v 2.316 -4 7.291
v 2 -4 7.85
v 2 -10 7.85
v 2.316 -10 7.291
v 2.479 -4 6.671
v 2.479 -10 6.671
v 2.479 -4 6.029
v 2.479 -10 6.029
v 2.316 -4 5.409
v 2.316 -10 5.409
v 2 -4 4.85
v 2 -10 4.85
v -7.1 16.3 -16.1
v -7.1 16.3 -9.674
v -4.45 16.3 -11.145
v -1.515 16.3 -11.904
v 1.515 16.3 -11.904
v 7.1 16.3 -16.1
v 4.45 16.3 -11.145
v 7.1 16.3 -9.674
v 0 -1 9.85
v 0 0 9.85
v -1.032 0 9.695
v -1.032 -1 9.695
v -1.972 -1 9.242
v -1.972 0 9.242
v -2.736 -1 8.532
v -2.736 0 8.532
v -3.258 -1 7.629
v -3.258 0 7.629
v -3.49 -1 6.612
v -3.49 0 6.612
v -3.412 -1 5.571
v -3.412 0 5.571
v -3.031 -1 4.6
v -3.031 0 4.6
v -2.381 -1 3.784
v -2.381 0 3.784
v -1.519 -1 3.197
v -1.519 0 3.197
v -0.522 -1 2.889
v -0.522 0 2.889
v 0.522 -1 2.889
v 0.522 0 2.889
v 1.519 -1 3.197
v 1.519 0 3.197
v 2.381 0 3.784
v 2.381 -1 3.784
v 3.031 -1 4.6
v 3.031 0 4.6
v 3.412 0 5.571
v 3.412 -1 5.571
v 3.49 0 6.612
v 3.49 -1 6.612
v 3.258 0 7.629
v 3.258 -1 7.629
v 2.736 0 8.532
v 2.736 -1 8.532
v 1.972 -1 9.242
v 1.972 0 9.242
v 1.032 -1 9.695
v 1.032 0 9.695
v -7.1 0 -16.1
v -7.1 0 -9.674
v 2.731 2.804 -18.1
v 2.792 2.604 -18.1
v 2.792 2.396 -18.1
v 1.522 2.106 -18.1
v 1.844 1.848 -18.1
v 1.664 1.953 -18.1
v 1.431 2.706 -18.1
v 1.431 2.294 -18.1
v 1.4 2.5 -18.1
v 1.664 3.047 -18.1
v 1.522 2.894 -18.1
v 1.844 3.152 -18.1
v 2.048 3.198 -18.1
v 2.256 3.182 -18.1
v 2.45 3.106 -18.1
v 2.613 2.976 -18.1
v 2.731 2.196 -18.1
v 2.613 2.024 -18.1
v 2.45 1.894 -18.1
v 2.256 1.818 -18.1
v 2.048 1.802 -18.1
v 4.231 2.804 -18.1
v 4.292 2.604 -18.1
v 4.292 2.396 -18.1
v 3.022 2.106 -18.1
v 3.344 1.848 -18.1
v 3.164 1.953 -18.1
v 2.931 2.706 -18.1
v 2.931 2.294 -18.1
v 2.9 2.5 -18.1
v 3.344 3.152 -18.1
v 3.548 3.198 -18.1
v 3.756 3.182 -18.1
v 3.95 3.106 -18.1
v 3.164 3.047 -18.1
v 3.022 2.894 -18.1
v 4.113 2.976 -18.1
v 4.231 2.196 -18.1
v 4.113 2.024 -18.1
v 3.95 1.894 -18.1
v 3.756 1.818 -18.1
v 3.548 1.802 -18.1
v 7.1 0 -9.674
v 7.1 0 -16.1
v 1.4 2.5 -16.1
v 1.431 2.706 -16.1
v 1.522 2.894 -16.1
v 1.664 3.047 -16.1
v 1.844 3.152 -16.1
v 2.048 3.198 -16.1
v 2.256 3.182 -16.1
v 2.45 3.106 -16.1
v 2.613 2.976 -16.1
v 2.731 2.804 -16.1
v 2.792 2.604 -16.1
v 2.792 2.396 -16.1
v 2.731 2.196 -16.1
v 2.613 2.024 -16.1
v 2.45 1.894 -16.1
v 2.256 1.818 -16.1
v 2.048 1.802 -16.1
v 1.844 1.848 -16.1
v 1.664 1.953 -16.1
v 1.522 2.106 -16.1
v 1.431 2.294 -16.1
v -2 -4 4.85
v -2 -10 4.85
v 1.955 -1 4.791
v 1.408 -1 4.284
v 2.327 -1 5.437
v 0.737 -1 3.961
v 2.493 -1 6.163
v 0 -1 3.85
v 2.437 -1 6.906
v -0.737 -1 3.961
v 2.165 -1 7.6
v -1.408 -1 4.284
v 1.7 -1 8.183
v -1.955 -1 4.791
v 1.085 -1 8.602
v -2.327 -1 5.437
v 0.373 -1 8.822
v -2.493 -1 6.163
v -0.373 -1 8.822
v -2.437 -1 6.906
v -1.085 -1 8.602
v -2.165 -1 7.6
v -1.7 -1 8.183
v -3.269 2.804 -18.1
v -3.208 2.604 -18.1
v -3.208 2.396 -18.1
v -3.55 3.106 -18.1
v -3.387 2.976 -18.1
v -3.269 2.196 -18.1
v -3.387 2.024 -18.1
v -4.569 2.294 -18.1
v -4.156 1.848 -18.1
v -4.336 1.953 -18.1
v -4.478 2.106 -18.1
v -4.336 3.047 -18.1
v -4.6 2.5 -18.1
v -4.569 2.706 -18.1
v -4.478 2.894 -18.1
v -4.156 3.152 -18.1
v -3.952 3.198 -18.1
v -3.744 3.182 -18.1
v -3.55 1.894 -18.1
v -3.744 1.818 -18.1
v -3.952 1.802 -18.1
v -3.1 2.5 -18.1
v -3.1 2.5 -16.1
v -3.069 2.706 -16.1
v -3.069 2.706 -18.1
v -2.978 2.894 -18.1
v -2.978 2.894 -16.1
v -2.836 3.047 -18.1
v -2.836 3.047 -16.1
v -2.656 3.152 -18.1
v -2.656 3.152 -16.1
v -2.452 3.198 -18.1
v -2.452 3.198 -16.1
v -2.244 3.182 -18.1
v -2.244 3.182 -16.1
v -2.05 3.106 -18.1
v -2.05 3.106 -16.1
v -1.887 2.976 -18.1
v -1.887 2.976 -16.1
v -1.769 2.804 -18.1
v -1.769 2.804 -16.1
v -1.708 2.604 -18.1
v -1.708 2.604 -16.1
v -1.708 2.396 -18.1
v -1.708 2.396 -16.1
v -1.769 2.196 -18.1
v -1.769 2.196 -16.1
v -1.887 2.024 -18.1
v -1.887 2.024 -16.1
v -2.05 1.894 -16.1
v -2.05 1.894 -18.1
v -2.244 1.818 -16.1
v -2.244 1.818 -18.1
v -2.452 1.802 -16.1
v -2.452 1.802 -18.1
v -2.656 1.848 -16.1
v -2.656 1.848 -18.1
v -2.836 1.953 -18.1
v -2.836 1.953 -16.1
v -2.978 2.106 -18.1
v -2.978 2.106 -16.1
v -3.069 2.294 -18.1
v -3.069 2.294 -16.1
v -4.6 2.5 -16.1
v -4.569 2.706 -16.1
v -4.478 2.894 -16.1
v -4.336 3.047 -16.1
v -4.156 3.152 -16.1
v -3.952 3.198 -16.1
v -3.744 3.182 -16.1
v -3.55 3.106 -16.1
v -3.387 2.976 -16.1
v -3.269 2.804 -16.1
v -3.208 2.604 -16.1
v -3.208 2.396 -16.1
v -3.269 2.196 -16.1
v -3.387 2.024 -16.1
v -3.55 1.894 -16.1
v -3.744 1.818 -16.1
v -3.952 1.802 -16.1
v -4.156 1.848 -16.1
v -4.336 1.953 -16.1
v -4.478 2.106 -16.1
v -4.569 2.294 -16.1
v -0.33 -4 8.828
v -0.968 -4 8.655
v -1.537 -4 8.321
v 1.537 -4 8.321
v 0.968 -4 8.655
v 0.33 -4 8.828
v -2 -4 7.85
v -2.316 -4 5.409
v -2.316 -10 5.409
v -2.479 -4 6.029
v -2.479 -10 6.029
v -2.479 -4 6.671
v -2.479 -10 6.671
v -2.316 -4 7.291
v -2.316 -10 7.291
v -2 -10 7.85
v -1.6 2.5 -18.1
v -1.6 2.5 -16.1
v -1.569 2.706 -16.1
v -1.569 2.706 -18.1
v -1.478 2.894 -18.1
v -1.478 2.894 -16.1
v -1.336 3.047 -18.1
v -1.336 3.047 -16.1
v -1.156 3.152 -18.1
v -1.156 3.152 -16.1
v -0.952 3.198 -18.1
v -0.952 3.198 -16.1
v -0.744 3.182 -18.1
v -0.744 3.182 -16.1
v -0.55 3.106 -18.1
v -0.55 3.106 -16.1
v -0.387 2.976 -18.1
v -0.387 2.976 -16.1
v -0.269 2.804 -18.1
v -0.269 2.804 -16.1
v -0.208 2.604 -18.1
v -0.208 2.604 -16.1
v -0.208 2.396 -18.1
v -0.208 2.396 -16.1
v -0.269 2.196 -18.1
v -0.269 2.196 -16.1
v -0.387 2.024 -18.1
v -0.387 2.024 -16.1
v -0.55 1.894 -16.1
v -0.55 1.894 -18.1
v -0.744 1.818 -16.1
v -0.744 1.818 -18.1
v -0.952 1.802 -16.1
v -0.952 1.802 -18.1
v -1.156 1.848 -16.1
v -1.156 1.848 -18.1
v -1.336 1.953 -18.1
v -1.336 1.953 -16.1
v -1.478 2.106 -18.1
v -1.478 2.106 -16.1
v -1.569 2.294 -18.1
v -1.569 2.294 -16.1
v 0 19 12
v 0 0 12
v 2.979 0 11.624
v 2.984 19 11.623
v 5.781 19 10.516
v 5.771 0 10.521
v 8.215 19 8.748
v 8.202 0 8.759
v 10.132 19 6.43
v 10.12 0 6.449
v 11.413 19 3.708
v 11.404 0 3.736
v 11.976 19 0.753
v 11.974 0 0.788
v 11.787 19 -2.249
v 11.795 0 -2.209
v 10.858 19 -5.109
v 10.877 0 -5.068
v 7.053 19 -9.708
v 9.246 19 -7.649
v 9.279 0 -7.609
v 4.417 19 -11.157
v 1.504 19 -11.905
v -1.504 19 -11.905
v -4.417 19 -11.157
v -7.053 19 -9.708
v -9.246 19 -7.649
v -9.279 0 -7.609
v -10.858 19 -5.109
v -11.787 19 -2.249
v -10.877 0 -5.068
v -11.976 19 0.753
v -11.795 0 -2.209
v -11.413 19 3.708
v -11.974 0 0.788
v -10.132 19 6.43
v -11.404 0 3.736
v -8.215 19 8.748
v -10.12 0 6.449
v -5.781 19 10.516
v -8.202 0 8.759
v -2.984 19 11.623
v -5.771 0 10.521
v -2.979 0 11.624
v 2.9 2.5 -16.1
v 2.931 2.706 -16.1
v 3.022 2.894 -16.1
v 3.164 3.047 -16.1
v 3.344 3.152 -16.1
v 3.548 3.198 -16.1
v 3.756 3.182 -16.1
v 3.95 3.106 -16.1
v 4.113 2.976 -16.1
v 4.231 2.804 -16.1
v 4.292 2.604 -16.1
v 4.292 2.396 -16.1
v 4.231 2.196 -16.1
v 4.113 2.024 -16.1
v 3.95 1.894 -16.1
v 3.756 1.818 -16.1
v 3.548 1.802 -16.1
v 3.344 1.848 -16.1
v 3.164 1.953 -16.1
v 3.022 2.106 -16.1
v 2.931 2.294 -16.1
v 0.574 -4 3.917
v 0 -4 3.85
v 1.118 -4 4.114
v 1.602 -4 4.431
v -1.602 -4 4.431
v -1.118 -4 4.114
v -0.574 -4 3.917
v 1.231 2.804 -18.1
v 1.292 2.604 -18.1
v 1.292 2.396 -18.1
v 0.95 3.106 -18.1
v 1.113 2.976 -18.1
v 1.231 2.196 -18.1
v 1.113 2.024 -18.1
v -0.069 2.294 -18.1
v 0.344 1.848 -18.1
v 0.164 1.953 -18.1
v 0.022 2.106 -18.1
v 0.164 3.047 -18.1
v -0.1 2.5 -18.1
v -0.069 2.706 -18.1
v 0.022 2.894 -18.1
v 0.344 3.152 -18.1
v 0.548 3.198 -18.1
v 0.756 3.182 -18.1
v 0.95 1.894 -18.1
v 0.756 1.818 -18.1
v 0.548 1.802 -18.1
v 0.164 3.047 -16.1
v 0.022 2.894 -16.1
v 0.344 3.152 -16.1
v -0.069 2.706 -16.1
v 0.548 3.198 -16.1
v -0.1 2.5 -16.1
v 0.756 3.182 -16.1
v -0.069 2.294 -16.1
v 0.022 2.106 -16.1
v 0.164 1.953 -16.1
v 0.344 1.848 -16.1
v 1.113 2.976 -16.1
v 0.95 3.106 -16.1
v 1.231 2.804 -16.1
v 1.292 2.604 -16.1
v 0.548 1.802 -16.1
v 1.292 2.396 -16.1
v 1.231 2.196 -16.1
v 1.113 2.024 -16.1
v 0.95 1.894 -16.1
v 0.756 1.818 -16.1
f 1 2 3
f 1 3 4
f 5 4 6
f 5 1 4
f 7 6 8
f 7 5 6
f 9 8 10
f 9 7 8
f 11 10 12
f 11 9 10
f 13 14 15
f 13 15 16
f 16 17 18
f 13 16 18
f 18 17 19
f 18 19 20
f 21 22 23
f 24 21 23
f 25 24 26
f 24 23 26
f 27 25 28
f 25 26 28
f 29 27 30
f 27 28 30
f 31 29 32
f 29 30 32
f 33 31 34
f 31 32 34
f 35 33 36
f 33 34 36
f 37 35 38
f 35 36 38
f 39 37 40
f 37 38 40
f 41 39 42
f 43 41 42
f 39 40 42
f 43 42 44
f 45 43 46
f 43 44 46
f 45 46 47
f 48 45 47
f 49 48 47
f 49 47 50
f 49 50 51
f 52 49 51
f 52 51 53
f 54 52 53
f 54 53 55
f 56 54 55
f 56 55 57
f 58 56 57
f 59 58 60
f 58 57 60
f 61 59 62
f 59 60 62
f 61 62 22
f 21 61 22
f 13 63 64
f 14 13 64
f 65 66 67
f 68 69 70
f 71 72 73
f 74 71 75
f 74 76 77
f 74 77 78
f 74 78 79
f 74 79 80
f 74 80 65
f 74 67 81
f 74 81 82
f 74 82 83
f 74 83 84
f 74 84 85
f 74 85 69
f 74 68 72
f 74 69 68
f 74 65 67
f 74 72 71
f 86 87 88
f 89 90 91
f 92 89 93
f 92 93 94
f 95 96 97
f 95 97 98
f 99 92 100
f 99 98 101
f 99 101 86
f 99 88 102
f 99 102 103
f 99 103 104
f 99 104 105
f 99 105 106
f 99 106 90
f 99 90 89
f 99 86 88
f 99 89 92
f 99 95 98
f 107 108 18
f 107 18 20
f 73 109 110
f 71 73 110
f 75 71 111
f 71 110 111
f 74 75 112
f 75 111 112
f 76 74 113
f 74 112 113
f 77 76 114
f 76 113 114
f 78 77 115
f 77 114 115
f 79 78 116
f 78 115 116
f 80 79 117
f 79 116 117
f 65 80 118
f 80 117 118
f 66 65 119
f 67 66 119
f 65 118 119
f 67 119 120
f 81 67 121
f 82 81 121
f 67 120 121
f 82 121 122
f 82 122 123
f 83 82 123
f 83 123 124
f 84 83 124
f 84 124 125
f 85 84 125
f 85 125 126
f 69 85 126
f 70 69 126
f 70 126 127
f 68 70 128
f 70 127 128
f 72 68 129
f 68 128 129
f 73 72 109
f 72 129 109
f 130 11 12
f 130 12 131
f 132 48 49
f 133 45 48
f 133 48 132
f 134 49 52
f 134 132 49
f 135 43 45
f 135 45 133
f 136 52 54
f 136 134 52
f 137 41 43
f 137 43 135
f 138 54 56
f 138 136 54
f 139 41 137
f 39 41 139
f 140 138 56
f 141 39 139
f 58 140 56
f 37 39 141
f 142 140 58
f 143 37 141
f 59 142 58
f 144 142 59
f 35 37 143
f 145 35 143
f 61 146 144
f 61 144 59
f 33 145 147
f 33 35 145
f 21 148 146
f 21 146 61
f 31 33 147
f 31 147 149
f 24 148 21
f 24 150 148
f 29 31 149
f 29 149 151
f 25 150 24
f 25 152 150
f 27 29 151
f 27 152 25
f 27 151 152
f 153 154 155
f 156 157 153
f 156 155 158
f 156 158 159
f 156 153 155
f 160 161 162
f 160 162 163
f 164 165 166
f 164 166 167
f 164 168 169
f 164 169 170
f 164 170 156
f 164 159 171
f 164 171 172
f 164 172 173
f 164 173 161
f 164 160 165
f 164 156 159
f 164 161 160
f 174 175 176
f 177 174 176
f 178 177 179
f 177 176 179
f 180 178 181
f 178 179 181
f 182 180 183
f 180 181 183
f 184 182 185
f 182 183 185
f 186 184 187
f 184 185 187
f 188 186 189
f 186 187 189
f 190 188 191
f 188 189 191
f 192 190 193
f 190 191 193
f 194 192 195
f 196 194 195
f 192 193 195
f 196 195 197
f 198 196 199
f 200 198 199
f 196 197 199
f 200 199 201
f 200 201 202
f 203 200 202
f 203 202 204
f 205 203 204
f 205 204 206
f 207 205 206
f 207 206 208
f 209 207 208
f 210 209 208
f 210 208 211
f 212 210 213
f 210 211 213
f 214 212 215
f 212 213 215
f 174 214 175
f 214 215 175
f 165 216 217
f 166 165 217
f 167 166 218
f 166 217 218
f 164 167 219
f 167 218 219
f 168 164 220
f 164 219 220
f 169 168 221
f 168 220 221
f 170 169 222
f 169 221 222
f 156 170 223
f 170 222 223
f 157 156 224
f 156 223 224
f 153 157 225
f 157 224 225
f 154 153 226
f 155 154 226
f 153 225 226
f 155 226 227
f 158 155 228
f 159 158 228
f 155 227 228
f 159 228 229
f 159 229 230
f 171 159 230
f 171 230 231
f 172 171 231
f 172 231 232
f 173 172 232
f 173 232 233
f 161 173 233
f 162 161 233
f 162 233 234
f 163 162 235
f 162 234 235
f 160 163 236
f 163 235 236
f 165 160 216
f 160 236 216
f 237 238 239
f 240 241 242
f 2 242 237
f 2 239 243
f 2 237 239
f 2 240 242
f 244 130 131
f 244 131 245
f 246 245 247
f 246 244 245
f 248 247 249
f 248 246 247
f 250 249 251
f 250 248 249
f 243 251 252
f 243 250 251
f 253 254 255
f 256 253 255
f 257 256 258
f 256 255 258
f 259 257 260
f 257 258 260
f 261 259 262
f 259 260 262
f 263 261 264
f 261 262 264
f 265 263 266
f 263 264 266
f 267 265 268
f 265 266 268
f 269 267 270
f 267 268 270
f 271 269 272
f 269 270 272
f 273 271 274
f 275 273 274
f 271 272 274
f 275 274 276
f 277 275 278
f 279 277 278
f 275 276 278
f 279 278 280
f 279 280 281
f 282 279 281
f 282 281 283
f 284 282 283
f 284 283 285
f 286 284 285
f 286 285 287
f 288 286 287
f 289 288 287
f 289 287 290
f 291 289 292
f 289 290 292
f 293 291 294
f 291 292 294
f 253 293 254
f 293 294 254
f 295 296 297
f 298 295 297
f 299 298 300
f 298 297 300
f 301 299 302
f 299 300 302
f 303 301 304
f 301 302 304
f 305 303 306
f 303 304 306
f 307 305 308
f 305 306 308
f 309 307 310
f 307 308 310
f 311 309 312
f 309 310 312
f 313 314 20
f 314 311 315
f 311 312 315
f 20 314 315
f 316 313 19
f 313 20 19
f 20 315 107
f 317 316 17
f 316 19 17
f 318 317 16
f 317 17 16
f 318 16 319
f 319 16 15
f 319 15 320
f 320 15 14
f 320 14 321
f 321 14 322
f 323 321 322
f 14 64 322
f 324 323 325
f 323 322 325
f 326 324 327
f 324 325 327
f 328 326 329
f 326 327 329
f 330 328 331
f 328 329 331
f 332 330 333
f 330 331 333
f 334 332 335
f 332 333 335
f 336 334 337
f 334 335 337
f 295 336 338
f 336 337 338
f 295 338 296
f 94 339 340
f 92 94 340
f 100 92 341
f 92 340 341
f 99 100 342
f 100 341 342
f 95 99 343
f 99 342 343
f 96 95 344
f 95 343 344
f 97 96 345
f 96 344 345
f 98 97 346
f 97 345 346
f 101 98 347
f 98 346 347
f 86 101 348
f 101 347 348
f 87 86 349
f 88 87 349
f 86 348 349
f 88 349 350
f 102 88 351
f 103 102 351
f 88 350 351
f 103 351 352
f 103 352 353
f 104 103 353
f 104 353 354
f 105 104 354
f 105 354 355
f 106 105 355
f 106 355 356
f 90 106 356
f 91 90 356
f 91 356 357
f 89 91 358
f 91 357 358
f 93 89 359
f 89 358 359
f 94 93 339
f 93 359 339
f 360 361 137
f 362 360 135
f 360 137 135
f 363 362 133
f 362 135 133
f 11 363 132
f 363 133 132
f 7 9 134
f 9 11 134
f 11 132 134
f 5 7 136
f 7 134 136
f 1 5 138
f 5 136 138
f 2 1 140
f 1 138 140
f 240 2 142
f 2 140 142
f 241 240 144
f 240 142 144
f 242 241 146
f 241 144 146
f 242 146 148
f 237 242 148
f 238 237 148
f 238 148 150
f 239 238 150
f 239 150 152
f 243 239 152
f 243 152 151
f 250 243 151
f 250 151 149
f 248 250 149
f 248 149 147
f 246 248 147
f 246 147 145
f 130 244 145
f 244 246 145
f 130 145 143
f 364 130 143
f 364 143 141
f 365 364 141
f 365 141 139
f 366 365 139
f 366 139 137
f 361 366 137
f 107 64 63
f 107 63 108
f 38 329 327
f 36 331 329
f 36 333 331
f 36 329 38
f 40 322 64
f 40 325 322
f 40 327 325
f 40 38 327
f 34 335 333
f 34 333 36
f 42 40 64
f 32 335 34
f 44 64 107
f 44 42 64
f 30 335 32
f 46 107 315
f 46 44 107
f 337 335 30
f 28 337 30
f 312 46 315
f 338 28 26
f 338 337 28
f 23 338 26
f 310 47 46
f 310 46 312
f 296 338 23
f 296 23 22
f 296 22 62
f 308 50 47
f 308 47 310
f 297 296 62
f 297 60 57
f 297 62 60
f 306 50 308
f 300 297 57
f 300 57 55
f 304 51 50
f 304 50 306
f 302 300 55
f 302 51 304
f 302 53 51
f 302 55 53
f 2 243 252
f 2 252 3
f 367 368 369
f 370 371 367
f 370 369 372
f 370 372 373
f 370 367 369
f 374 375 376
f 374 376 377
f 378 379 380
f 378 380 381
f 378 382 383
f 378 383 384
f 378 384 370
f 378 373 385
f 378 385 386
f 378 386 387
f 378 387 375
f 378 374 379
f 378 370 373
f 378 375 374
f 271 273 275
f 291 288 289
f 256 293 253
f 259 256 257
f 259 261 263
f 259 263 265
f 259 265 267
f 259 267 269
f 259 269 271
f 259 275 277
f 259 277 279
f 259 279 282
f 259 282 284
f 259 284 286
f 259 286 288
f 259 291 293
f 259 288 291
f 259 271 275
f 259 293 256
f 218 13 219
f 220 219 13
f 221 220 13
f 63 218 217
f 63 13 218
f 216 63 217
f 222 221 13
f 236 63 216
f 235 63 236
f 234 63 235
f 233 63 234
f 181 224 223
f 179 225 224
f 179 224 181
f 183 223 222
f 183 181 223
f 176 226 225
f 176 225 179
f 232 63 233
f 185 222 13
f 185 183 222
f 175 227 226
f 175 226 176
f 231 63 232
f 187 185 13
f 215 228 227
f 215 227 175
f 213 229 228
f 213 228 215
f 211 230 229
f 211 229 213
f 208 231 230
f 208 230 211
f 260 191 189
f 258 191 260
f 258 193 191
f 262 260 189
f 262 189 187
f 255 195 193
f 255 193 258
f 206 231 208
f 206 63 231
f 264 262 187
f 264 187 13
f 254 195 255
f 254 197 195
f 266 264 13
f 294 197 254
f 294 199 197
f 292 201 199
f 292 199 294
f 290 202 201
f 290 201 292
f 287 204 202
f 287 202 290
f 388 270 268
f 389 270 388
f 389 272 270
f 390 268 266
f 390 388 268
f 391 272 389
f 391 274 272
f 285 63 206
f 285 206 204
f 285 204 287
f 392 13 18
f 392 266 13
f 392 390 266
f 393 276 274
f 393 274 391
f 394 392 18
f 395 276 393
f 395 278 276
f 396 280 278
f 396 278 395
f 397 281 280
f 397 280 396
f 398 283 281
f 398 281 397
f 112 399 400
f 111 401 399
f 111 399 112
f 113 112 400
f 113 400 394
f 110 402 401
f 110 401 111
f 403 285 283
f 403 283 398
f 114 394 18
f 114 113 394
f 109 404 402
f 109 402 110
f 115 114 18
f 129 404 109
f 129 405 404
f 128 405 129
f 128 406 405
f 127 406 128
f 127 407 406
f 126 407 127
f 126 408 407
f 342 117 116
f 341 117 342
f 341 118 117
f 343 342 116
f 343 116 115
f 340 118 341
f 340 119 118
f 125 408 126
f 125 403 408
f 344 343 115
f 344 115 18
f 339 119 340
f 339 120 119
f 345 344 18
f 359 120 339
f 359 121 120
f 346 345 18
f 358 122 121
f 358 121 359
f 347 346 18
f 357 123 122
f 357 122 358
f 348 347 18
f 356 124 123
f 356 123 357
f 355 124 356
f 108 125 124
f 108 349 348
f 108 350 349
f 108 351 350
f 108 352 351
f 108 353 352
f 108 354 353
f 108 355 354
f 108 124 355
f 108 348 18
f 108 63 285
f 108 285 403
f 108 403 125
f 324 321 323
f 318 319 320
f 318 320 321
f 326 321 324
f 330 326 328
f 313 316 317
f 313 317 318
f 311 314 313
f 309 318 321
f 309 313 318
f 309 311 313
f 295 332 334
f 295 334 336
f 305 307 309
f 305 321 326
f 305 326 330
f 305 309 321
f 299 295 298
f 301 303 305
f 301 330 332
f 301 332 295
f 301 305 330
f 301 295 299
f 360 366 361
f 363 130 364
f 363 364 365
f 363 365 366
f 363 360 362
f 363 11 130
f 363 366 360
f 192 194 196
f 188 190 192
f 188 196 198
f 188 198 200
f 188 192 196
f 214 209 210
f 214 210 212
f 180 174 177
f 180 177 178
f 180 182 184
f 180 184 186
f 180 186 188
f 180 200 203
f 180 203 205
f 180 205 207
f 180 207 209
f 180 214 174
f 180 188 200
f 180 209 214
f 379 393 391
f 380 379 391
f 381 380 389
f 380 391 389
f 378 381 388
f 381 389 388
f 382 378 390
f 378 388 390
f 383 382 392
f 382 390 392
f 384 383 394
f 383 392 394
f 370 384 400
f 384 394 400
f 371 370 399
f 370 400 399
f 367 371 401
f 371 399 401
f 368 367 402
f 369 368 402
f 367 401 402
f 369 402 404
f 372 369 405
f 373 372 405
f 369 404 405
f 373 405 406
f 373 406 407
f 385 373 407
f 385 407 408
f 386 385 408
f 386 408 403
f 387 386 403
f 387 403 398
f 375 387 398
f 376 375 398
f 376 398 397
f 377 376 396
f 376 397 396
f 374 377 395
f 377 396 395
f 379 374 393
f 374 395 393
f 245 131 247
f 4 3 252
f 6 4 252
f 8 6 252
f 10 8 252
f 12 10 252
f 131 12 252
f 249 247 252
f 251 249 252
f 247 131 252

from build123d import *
from build123d.topology import SkipClean

# Parameters (mm, degrees)
SKETCH_1_R      = 12
EXTRUDE_1_DEPTH = 19
SKETCH_2_W      = 14.2
SKETCH_2_H      = 6.425807527
EXTRUDE_2_DEPTH = 16.3
SKETCH_3_R      = 3.5
EXTRUDE_3_DEPTH = 1
SKETCH_4_R      = 2.5
EXTRUDE_4_DEPTH = 3
EXTRUDE_5_DEPTH = 6
SKETCH_6_R      = 0.7
EXTRUDE_6_DEPTH = 2


with BuildPart() as part:
    # 草图1 → 凸台-拉伸1 (new body)
    with BuildSketch(Plane(origin=(0, 0, 0), x_dir=(1, 0, 0), z_dir=(0, 1, 0))):
        with Locations(Location((0, 0, 0), (0, 0, 270))):
            Circle(SKETCH_1_R)
    extrude(amount=EXTRUDE_1_DEPTH)

    # 草图2 → 凸台-拉伸2 (add)
    with BuildSketch(Plane.XZ):
        with Locations((0, -12.887096236)):
            Rectangle(SKETCH_2_W, SKETCH_2_H)
    extrude(amount=-EXTRUDE_2_DEPTH)

    # 草图3 → 凸台-拉伸3 (add)
    with BuildSketch(Plane.XZ):
        with Locations(Location((0, 6.35, 0), (0, 0, 90))):
            Circle(SKETCH_3_R)
    extrude(amount=EXTRUDE_3_DEPTH)

    # 草图4 → 凸台-拉伸4 (add)
    with BuildSketch(Plane.XZ.offset(1)):
        with Locations(Location((0, 6.35, 0), (0, 0, 270))):
            Circle(SKETCH_4_R)
    extrude(amount=EXTRUDE_4_DEPTH)

    # 草图5 → 凸台-拉伸5 (add)
    with SkipClean():  # the faces are left unmerged after this step: merging them gives an invalid solid
        with BuildSketch(Plane.XZ.offset(4)):
            with BuildLine():
                Line((-2, 7.85), (2, 7.85))
                ThreePointArc((2, 7.85), (2.5, 6.35), (2, 4.85))
                Line((2, 4.85), (-2, 4.85))
                ThreePointArc((-2, 4.85), (-2.5, 6.35), (-2, 7.85))
            make_face()
        extrude(amount=EXTRUDE_5_DEPTH)

    # 草图6 → 凸台-拉伸6 (add)
    with SkipClean():  # the faces are left unmerged after this step: merging them gives an invalid solid
        with BuildSketch(Plane(origin=(0, 0, -16.1), x_dir=(-1, 0, 0), z_dir=(0, 0, -1))):
            with Locations((-3.6, 2.5)):
                Circle(SKETCH_6_R)
            with Locations((-2.1, 2.5)):
                Circle(SKETCH_6_R)
            with Locations((-0.6, 2.5)):
                Circle(SKETCH_6_R)
            with Locations((0.9, 2.5)):
                Circle(SKETCH_6_R)
            with Locations((2.4, 2.5)):
                Circle(SKETCH_6_R)
            with Locations((3.9, 2.5)):
                Circle(SKETCH_6_R)
        extrude(amount=EXTRUDE_6_DEPTH)


solid = part.part
